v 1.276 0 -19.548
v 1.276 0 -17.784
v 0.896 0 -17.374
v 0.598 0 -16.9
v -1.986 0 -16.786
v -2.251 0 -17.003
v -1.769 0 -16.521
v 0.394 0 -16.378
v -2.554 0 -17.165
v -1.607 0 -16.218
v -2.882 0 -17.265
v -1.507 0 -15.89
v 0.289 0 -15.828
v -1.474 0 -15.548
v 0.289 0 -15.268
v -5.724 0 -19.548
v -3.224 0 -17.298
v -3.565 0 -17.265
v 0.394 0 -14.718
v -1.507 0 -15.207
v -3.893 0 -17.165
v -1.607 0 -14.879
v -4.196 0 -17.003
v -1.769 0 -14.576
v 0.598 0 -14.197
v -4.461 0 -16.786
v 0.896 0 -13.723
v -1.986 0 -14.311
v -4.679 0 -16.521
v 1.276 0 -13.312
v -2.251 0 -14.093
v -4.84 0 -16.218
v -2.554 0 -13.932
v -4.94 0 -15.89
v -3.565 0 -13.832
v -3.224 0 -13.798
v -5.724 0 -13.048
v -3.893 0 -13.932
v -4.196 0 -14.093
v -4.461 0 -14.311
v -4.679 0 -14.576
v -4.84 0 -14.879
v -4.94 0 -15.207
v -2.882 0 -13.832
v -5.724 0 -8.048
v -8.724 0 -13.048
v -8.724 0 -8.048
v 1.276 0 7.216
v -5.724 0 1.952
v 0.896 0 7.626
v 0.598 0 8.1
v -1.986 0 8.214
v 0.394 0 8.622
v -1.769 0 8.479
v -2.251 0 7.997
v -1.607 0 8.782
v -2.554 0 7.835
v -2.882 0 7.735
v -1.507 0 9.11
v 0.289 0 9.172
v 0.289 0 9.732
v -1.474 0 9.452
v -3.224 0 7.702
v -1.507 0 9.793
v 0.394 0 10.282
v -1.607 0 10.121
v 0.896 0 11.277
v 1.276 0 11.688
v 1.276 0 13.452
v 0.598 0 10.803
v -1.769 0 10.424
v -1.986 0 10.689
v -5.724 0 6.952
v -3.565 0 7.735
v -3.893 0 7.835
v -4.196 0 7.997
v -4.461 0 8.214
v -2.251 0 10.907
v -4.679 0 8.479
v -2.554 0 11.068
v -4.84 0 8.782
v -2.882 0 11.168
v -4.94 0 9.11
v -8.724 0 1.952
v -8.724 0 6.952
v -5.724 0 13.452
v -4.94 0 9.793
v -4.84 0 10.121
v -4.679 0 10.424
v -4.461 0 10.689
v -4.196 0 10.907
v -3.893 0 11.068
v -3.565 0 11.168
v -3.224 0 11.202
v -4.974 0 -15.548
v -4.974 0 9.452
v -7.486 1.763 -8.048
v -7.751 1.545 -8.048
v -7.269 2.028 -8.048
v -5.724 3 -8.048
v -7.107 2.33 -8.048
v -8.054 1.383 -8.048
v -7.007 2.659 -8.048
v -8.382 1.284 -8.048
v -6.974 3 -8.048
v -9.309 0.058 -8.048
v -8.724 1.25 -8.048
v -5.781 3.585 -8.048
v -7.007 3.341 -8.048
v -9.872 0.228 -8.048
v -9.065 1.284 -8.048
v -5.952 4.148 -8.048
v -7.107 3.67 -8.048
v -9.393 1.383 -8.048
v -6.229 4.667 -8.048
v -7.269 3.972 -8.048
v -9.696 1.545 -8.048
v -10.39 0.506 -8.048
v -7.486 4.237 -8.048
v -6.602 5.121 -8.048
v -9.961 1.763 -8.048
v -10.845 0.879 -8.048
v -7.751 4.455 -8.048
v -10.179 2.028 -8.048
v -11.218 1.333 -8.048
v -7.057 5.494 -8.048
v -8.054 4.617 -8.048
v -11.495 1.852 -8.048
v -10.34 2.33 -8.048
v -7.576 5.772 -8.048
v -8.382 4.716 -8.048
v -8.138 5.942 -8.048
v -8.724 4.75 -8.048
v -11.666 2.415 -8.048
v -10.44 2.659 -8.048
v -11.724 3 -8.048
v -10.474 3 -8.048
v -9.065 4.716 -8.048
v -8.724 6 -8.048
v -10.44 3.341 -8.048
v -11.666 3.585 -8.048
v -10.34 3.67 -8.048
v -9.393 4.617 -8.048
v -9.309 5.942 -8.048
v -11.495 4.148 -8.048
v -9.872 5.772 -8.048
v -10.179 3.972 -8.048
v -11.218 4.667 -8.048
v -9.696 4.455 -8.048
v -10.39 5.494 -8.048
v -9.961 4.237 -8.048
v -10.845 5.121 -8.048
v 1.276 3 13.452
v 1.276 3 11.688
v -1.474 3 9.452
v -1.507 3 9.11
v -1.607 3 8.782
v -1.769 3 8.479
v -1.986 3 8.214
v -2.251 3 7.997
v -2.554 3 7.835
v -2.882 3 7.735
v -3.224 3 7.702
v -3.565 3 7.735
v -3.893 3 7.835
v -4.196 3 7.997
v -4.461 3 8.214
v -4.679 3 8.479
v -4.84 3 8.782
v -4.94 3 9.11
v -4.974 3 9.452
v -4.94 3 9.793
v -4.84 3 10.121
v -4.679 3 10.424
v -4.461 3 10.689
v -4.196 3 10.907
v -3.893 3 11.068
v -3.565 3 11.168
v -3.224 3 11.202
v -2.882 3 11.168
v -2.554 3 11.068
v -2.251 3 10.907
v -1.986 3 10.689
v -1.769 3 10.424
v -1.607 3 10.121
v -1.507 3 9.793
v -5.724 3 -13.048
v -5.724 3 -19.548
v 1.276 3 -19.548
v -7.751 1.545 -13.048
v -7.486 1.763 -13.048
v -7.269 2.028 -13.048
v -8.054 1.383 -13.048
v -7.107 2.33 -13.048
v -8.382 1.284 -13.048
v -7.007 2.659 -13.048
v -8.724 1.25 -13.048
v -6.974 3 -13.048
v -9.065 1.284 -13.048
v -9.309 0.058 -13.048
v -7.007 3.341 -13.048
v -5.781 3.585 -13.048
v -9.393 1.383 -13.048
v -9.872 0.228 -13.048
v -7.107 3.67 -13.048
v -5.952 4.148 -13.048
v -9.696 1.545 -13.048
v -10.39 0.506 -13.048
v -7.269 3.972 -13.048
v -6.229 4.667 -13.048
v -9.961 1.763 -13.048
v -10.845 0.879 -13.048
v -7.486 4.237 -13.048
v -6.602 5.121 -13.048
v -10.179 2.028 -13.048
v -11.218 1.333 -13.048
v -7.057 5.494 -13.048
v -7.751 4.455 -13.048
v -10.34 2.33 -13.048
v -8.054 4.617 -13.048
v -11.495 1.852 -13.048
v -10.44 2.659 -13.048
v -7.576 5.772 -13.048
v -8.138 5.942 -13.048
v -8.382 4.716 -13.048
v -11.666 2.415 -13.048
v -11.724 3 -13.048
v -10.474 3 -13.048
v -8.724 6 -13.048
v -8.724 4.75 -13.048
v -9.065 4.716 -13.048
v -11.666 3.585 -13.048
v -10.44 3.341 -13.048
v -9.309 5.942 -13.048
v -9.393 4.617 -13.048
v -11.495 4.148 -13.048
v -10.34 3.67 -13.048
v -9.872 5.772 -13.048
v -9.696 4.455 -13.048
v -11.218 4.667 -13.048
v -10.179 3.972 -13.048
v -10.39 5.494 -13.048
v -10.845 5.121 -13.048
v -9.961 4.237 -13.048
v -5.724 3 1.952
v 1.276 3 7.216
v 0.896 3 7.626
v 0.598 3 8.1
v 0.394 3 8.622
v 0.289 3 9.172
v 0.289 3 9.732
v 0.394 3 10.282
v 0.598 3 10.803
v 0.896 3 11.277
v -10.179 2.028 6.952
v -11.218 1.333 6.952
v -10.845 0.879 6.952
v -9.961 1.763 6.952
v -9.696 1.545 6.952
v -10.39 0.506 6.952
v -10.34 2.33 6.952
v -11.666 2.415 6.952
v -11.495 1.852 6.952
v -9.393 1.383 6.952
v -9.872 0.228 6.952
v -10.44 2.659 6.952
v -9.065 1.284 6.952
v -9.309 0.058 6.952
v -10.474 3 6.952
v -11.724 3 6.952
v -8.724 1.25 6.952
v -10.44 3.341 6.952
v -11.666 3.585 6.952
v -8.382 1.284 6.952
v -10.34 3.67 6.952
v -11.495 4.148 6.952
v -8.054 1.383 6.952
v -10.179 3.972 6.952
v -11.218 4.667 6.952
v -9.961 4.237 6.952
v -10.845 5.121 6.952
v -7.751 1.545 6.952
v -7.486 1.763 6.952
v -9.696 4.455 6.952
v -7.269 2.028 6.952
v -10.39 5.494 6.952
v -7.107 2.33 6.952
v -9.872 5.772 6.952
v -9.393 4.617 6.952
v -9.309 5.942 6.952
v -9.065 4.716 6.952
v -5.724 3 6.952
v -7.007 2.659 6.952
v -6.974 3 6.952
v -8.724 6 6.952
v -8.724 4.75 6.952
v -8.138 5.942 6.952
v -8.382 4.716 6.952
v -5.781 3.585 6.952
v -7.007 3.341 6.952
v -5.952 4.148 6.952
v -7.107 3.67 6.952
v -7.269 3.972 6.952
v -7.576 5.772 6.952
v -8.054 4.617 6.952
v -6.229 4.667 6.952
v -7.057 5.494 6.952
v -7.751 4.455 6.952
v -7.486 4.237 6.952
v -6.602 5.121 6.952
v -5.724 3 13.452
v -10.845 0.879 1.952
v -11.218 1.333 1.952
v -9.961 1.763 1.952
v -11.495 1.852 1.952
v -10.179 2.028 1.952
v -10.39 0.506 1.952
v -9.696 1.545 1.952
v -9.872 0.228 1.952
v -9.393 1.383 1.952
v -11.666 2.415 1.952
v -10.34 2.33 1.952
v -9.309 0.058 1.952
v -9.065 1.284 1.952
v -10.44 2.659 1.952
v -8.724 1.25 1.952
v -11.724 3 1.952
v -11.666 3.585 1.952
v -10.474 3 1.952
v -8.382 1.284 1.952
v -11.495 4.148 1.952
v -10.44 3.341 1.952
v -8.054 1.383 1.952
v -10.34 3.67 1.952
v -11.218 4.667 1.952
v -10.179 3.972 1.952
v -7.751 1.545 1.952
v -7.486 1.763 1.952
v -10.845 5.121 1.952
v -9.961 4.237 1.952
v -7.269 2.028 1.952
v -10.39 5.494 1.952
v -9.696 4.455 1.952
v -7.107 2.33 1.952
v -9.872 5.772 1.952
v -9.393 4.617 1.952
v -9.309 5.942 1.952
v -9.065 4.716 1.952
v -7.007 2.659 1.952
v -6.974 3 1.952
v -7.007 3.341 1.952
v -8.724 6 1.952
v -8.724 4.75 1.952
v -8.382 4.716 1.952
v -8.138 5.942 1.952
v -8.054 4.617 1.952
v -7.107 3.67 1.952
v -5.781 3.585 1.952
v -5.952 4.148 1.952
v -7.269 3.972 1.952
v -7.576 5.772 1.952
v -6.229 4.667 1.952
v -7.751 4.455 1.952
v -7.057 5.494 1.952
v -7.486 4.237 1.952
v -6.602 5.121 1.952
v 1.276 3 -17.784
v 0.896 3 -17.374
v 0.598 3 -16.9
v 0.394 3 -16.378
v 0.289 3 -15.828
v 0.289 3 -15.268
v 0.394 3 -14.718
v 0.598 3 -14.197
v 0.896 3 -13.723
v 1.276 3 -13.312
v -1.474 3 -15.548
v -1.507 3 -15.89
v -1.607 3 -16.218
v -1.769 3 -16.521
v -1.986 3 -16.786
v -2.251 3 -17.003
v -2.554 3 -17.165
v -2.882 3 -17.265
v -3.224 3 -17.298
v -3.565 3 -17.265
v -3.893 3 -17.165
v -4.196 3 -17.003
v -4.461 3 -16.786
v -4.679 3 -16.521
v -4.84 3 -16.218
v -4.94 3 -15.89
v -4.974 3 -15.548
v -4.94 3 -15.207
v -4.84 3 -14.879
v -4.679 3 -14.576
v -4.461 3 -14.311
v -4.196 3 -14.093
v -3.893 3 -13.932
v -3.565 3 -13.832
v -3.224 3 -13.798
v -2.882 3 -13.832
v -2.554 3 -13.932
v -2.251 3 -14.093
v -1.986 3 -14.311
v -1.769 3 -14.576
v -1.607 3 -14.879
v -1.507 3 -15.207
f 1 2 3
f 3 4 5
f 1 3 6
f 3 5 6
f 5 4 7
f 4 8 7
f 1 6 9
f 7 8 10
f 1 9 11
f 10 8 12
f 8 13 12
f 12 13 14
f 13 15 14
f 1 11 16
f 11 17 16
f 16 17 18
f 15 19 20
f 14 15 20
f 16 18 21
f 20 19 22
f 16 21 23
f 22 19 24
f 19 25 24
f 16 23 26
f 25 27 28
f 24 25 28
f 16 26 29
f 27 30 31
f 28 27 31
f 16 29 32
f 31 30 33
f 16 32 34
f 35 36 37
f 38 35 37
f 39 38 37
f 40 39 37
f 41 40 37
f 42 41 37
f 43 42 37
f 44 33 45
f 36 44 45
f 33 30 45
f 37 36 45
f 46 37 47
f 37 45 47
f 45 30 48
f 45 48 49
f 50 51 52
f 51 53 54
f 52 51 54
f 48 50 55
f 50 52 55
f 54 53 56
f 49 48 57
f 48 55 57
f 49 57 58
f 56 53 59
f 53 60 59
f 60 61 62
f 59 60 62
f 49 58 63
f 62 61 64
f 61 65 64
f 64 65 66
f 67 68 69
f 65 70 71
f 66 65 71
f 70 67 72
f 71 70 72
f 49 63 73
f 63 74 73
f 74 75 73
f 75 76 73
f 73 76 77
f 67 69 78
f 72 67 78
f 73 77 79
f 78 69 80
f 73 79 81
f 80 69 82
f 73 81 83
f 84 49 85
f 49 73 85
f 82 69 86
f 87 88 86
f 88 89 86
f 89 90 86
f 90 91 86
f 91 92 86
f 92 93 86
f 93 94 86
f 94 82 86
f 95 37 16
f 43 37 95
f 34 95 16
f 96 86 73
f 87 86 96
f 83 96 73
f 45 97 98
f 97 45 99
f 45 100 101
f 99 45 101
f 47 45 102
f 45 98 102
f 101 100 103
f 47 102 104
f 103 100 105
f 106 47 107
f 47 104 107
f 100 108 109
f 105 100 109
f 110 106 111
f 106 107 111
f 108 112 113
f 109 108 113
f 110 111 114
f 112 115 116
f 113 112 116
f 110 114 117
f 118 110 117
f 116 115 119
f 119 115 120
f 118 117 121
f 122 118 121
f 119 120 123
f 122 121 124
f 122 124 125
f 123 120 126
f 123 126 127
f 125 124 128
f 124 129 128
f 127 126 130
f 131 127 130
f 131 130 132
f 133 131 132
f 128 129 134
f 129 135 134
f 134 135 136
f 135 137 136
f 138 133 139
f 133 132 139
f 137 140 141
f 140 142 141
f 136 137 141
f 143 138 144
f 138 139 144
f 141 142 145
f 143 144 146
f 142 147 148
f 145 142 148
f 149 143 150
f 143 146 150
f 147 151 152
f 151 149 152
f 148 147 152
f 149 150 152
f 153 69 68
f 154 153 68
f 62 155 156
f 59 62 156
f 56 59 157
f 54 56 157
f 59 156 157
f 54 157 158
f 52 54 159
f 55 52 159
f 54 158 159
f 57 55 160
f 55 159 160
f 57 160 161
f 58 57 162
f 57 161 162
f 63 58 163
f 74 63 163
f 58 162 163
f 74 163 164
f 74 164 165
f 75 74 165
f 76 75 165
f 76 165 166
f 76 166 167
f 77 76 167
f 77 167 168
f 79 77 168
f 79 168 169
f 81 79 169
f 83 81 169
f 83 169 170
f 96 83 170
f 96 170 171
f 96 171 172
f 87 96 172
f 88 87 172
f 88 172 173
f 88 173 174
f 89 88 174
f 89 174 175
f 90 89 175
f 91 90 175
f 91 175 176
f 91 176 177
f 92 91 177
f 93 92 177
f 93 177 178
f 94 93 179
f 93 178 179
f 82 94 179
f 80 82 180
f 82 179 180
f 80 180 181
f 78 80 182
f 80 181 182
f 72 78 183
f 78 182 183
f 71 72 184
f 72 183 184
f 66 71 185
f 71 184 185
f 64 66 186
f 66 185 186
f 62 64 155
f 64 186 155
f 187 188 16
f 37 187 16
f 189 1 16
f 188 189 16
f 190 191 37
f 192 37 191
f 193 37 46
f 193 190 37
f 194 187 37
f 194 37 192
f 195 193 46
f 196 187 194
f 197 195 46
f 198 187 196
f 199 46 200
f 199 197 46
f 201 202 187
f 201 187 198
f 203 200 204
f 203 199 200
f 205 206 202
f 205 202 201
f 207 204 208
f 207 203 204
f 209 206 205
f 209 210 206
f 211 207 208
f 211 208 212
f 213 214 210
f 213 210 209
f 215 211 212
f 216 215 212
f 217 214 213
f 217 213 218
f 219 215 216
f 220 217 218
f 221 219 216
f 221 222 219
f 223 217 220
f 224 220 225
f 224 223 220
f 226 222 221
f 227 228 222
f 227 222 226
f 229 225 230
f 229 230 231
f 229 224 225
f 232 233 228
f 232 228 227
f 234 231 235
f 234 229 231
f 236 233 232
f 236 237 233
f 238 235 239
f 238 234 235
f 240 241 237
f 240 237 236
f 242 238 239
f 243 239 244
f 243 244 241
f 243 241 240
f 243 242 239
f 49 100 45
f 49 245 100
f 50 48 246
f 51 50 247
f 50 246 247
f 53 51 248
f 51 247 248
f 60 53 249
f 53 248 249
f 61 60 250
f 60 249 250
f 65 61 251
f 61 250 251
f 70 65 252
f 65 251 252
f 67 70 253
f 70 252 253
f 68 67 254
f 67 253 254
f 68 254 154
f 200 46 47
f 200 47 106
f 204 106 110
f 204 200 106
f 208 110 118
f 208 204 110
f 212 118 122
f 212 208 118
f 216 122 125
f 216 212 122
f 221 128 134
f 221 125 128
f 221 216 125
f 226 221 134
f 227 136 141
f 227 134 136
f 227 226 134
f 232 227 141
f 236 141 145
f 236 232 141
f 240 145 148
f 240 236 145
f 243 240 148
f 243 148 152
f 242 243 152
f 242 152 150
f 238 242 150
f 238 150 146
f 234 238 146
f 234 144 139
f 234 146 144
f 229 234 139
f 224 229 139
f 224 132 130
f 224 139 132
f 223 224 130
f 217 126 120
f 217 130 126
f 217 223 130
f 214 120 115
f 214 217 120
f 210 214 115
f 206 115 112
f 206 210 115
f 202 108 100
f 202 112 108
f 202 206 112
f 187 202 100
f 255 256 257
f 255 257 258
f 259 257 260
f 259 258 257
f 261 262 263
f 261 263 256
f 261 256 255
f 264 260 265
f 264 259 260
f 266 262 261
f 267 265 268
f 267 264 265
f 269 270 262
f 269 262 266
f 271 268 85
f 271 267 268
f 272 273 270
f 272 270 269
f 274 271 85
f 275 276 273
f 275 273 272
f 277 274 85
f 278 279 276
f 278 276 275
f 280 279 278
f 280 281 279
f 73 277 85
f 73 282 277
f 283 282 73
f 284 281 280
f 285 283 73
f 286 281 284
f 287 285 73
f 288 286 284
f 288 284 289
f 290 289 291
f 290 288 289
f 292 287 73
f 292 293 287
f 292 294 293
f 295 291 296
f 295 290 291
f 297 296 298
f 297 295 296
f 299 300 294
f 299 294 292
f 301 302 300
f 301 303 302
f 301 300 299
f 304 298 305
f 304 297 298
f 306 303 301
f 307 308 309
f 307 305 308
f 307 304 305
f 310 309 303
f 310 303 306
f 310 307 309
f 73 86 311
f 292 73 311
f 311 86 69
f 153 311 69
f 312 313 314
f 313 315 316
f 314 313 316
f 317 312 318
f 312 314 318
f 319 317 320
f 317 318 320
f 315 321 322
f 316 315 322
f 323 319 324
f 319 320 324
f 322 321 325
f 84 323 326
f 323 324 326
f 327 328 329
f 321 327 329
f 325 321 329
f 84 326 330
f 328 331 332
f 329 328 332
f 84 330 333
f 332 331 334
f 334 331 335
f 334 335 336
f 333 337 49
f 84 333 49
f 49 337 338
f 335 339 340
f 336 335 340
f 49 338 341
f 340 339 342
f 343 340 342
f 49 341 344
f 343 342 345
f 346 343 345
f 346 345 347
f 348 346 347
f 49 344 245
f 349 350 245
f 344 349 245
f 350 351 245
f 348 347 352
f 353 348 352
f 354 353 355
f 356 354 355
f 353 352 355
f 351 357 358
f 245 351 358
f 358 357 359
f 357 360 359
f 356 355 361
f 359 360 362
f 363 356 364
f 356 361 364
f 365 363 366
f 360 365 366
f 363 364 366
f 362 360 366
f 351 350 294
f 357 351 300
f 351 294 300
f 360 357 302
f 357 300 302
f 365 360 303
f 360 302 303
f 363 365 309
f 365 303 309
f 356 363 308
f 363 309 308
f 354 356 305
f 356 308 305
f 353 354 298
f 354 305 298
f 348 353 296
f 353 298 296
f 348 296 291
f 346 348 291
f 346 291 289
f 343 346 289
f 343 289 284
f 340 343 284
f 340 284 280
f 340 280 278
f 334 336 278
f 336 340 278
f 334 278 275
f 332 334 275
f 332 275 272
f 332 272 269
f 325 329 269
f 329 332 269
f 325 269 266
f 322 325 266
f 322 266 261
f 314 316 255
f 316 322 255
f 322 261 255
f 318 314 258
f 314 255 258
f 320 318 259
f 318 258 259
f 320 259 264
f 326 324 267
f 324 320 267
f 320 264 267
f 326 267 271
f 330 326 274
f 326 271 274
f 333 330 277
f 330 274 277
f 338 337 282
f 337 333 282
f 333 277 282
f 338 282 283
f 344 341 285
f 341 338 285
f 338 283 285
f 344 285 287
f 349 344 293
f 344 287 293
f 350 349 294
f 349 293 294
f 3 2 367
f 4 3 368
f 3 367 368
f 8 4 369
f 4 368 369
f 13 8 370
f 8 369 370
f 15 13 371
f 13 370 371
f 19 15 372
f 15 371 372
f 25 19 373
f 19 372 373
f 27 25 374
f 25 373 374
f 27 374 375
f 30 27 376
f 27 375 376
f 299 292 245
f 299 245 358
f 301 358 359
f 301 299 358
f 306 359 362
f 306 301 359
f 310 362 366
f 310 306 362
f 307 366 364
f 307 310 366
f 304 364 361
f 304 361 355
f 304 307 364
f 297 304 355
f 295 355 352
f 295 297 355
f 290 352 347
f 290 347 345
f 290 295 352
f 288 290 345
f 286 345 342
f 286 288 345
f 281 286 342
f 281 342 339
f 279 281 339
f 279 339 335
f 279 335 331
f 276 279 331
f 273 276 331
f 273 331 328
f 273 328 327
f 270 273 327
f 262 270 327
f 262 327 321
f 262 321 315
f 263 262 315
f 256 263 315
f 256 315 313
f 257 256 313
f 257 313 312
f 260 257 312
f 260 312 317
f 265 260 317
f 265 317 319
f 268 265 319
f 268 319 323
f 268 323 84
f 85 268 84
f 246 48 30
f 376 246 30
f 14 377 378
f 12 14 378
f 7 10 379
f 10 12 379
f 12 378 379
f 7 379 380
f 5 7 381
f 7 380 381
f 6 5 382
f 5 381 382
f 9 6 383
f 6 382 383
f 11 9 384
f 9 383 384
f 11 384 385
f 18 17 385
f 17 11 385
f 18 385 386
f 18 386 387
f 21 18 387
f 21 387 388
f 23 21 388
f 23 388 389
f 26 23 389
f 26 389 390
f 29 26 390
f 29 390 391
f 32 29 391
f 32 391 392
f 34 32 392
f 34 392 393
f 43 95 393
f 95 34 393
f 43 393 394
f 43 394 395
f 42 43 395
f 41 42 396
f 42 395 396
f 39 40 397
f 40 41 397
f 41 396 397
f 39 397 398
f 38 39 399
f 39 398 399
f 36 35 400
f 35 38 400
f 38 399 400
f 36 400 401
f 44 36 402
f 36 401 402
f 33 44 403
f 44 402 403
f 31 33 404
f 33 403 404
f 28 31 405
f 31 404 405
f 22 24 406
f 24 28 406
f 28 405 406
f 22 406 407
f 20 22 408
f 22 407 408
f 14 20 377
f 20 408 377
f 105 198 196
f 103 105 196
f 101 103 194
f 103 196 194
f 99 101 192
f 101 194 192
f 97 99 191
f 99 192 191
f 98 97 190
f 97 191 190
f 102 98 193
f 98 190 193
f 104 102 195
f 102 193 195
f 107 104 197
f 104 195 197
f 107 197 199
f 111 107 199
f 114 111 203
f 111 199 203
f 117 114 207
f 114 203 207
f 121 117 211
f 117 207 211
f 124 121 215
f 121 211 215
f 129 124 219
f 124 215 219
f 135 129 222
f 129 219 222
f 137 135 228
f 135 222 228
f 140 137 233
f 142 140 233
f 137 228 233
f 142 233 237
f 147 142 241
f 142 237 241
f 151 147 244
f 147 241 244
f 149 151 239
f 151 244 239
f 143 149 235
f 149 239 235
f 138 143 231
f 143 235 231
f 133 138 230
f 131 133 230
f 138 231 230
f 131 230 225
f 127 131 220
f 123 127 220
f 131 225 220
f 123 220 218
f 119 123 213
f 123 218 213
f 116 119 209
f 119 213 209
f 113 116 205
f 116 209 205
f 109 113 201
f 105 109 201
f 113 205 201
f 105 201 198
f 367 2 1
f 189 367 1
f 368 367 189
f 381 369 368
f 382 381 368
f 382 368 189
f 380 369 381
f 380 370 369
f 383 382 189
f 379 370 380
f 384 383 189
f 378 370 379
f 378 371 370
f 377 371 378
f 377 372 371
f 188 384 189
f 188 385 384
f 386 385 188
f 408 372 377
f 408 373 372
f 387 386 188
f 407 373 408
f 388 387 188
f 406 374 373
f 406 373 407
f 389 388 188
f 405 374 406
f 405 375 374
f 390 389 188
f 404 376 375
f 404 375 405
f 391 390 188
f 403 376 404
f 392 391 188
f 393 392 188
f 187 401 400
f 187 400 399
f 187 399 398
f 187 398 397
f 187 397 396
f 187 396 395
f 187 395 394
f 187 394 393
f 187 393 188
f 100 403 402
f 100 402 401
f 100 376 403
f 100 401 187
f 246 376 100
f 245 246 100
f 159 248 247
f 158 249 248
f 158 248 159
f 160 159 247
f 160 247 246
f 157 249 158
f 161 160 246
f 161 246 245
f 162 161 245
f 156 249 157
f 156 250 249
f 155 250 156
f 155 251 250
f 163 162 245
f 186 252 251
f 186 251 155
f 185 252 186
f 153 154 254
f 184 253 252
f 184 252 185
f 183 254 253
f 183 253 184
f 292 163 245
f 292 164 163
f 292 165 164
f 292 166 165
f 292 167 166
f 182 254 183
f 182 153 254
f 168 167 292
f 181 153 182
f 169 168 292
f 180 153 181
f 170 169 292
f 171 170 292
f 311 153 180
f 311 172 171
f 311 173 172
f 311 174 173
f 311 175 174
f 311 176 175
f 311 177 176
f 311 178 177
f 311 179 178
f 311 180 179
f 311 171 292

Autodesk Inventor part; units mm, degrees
ref_plane "YZ Plane" through (0, 0, 0) normal (1, 0, 0) x (0, 1, 0)
ref_plane "XZ Plane" through (0, 0, 0) normal (0, 1, 0) x (-1, 0, 0)
ref_plane "XY Plane" through (0, 0, 0) normal (0, 0, 1) x (1, 0, 0)
sketch "Sketch2" plane through (0, 0, 0) normal (0, 1, 0) x (-1, 0, 0)
  line L0 (8.7236, 13.4517) -> (-1.2764, 13.4517)
  line L1 (-1.2764, 13.4517) -> (-1.2764, -3.0483)
  line L2 (-1.2764, -3.0483) -> (8.7236, -3.0483)
  line L3 (8.7236, -3.0483) -> (8.7236, 13.4517)
  point P0 (0, 0)
  dimension "d2" = 10
  dimension "d3" = 16.5
extrude "Extrusion1" add sketch "Sketch2" along normal blind 3
ref_plane "Work Plane1" through (-8.7236, 0, 6.9517) normal (0, 0, 1) x (1, 0, 0)
sketch "Sketch5" plane through (-8.7236, 0, 13.4517) normal (0, 0, 1) x (1, 0, 0)
  line L0 (0, 3) -> (10, 3) projected
  line L1 (-3, 0) -> (3, 0)
  line L2 (3, 0) -> (3, 6)
  line L3 (3, 6) -> (-3, 6)
  line L4 (-3, 6) -> (-3, 0)
  line L5 (0, 0) -> (10, 0) projected
  point P0 (8.7236, 0)
  dimension "d41" = 6
  dimension "d42" = 6
  dimension "d43" = 3
extrude "Extrusion4" cut sketch "Sketch5" against normal blind 6.5
sketch "Sketch6" plane through (-8.7236, 0, 6.9517) normal (0, 0, 1) x (1, 0, 0)
  circle A0 centre (0, 3) radius 3
  arc A1 (0, 0) -> (3, 3) centre (0, 3) ccw projected
  point P0 (8.7236, 0)
  point P1 (0, 0.5)
  dimension "d16" = 6
extrude "Extrusion5" add sketch "Sketch6" against normal blind 5
sketch "Sketch7" plane through (-8.7236, 0, 6.9517) normal (0, 0, 1) x (1, 0, 0)
  arc A0 (3, 3) -> (0, 0) centre (0, 3) ccw projected
  circle A1 centre (0, 3) radius 1.75
  line L0 (3, 0) -> (0, 0) projected
  line L1 (3, 3) -> (3, 0) projected
  point P0 (8.7236, 0)
  dimension "d20" = 3.5
extrude "Extrusion6" cut sketch "Sketch7" against normal up to next contours A1
sketch "Sketch9" plane through (0, 3, 0) normal (0, 1, 0) x (1, 0, 0)
  circle A0 centre (-3.2236, -9.4517) radius 1.75
  line L0 (1.2764, -13.4517) -> (1.2764, 3.0483) projected
  line L1 (-5.7236, -13.4517) -> (1.2764, -13.4517) projected
  point P0 (0, 0)
  dimension "d28" = 3.5
  dimension "d29" = 4.5
  dimension "d30" = 4
extrude "Extrusion8" cut sketch "Sketch9" against normal up to next
mirror "Mirror2" about plane through (1.2764, 0, -3.0483) normal (0, 0, -1)
sketch "Sketch10" plane through (0, 3, 0) normal (0, 1, 0) x (1, 0, 0)
  circle A0 centre (3.2764, -9.4517) radius 3
  circle A1 centre (3.2764, 15.5483) radius 3
  line L0 (1.2764, -13.4517) -> (1.2764, 19.5483) projected
  point P0 (0, 0)
  dimension "d33" = 6
  dimension "d34" = 6
  dimension "d35" = 2
  dimension "d36" = 4
  dimension "d37" = 4
  dimension "d40" = 2
extrude "Extrusion9" cut sketch "Sketch10" against normal through all
sketch "Sketch11" plane through (-8.7236, 0, 1.9517) normal (0, 0, -1) x (-1, 0, 0)
  line L0 (-3, 0) -> (-10, 0) projected
  line L1 (-3, 0) -> (3, 0)
  line L2 (3, 0) -> (3, 6)
  line L3 (3, 6) -> (-3, 6)
  line L4 (-3, 6) -> (-3, 0)
  point P0 (-8.7236, 0)
  dimension "d44" = 6
  dimension "d45" = 6
extrude "Extrusion10" cut sketch "Sketch11" along normal blind 10
equation "\"d33\" = d34"
equation "\"d37\" = d36"
equation "\"d40\" = d35"
properties part number "k2_hinge1_bot"
